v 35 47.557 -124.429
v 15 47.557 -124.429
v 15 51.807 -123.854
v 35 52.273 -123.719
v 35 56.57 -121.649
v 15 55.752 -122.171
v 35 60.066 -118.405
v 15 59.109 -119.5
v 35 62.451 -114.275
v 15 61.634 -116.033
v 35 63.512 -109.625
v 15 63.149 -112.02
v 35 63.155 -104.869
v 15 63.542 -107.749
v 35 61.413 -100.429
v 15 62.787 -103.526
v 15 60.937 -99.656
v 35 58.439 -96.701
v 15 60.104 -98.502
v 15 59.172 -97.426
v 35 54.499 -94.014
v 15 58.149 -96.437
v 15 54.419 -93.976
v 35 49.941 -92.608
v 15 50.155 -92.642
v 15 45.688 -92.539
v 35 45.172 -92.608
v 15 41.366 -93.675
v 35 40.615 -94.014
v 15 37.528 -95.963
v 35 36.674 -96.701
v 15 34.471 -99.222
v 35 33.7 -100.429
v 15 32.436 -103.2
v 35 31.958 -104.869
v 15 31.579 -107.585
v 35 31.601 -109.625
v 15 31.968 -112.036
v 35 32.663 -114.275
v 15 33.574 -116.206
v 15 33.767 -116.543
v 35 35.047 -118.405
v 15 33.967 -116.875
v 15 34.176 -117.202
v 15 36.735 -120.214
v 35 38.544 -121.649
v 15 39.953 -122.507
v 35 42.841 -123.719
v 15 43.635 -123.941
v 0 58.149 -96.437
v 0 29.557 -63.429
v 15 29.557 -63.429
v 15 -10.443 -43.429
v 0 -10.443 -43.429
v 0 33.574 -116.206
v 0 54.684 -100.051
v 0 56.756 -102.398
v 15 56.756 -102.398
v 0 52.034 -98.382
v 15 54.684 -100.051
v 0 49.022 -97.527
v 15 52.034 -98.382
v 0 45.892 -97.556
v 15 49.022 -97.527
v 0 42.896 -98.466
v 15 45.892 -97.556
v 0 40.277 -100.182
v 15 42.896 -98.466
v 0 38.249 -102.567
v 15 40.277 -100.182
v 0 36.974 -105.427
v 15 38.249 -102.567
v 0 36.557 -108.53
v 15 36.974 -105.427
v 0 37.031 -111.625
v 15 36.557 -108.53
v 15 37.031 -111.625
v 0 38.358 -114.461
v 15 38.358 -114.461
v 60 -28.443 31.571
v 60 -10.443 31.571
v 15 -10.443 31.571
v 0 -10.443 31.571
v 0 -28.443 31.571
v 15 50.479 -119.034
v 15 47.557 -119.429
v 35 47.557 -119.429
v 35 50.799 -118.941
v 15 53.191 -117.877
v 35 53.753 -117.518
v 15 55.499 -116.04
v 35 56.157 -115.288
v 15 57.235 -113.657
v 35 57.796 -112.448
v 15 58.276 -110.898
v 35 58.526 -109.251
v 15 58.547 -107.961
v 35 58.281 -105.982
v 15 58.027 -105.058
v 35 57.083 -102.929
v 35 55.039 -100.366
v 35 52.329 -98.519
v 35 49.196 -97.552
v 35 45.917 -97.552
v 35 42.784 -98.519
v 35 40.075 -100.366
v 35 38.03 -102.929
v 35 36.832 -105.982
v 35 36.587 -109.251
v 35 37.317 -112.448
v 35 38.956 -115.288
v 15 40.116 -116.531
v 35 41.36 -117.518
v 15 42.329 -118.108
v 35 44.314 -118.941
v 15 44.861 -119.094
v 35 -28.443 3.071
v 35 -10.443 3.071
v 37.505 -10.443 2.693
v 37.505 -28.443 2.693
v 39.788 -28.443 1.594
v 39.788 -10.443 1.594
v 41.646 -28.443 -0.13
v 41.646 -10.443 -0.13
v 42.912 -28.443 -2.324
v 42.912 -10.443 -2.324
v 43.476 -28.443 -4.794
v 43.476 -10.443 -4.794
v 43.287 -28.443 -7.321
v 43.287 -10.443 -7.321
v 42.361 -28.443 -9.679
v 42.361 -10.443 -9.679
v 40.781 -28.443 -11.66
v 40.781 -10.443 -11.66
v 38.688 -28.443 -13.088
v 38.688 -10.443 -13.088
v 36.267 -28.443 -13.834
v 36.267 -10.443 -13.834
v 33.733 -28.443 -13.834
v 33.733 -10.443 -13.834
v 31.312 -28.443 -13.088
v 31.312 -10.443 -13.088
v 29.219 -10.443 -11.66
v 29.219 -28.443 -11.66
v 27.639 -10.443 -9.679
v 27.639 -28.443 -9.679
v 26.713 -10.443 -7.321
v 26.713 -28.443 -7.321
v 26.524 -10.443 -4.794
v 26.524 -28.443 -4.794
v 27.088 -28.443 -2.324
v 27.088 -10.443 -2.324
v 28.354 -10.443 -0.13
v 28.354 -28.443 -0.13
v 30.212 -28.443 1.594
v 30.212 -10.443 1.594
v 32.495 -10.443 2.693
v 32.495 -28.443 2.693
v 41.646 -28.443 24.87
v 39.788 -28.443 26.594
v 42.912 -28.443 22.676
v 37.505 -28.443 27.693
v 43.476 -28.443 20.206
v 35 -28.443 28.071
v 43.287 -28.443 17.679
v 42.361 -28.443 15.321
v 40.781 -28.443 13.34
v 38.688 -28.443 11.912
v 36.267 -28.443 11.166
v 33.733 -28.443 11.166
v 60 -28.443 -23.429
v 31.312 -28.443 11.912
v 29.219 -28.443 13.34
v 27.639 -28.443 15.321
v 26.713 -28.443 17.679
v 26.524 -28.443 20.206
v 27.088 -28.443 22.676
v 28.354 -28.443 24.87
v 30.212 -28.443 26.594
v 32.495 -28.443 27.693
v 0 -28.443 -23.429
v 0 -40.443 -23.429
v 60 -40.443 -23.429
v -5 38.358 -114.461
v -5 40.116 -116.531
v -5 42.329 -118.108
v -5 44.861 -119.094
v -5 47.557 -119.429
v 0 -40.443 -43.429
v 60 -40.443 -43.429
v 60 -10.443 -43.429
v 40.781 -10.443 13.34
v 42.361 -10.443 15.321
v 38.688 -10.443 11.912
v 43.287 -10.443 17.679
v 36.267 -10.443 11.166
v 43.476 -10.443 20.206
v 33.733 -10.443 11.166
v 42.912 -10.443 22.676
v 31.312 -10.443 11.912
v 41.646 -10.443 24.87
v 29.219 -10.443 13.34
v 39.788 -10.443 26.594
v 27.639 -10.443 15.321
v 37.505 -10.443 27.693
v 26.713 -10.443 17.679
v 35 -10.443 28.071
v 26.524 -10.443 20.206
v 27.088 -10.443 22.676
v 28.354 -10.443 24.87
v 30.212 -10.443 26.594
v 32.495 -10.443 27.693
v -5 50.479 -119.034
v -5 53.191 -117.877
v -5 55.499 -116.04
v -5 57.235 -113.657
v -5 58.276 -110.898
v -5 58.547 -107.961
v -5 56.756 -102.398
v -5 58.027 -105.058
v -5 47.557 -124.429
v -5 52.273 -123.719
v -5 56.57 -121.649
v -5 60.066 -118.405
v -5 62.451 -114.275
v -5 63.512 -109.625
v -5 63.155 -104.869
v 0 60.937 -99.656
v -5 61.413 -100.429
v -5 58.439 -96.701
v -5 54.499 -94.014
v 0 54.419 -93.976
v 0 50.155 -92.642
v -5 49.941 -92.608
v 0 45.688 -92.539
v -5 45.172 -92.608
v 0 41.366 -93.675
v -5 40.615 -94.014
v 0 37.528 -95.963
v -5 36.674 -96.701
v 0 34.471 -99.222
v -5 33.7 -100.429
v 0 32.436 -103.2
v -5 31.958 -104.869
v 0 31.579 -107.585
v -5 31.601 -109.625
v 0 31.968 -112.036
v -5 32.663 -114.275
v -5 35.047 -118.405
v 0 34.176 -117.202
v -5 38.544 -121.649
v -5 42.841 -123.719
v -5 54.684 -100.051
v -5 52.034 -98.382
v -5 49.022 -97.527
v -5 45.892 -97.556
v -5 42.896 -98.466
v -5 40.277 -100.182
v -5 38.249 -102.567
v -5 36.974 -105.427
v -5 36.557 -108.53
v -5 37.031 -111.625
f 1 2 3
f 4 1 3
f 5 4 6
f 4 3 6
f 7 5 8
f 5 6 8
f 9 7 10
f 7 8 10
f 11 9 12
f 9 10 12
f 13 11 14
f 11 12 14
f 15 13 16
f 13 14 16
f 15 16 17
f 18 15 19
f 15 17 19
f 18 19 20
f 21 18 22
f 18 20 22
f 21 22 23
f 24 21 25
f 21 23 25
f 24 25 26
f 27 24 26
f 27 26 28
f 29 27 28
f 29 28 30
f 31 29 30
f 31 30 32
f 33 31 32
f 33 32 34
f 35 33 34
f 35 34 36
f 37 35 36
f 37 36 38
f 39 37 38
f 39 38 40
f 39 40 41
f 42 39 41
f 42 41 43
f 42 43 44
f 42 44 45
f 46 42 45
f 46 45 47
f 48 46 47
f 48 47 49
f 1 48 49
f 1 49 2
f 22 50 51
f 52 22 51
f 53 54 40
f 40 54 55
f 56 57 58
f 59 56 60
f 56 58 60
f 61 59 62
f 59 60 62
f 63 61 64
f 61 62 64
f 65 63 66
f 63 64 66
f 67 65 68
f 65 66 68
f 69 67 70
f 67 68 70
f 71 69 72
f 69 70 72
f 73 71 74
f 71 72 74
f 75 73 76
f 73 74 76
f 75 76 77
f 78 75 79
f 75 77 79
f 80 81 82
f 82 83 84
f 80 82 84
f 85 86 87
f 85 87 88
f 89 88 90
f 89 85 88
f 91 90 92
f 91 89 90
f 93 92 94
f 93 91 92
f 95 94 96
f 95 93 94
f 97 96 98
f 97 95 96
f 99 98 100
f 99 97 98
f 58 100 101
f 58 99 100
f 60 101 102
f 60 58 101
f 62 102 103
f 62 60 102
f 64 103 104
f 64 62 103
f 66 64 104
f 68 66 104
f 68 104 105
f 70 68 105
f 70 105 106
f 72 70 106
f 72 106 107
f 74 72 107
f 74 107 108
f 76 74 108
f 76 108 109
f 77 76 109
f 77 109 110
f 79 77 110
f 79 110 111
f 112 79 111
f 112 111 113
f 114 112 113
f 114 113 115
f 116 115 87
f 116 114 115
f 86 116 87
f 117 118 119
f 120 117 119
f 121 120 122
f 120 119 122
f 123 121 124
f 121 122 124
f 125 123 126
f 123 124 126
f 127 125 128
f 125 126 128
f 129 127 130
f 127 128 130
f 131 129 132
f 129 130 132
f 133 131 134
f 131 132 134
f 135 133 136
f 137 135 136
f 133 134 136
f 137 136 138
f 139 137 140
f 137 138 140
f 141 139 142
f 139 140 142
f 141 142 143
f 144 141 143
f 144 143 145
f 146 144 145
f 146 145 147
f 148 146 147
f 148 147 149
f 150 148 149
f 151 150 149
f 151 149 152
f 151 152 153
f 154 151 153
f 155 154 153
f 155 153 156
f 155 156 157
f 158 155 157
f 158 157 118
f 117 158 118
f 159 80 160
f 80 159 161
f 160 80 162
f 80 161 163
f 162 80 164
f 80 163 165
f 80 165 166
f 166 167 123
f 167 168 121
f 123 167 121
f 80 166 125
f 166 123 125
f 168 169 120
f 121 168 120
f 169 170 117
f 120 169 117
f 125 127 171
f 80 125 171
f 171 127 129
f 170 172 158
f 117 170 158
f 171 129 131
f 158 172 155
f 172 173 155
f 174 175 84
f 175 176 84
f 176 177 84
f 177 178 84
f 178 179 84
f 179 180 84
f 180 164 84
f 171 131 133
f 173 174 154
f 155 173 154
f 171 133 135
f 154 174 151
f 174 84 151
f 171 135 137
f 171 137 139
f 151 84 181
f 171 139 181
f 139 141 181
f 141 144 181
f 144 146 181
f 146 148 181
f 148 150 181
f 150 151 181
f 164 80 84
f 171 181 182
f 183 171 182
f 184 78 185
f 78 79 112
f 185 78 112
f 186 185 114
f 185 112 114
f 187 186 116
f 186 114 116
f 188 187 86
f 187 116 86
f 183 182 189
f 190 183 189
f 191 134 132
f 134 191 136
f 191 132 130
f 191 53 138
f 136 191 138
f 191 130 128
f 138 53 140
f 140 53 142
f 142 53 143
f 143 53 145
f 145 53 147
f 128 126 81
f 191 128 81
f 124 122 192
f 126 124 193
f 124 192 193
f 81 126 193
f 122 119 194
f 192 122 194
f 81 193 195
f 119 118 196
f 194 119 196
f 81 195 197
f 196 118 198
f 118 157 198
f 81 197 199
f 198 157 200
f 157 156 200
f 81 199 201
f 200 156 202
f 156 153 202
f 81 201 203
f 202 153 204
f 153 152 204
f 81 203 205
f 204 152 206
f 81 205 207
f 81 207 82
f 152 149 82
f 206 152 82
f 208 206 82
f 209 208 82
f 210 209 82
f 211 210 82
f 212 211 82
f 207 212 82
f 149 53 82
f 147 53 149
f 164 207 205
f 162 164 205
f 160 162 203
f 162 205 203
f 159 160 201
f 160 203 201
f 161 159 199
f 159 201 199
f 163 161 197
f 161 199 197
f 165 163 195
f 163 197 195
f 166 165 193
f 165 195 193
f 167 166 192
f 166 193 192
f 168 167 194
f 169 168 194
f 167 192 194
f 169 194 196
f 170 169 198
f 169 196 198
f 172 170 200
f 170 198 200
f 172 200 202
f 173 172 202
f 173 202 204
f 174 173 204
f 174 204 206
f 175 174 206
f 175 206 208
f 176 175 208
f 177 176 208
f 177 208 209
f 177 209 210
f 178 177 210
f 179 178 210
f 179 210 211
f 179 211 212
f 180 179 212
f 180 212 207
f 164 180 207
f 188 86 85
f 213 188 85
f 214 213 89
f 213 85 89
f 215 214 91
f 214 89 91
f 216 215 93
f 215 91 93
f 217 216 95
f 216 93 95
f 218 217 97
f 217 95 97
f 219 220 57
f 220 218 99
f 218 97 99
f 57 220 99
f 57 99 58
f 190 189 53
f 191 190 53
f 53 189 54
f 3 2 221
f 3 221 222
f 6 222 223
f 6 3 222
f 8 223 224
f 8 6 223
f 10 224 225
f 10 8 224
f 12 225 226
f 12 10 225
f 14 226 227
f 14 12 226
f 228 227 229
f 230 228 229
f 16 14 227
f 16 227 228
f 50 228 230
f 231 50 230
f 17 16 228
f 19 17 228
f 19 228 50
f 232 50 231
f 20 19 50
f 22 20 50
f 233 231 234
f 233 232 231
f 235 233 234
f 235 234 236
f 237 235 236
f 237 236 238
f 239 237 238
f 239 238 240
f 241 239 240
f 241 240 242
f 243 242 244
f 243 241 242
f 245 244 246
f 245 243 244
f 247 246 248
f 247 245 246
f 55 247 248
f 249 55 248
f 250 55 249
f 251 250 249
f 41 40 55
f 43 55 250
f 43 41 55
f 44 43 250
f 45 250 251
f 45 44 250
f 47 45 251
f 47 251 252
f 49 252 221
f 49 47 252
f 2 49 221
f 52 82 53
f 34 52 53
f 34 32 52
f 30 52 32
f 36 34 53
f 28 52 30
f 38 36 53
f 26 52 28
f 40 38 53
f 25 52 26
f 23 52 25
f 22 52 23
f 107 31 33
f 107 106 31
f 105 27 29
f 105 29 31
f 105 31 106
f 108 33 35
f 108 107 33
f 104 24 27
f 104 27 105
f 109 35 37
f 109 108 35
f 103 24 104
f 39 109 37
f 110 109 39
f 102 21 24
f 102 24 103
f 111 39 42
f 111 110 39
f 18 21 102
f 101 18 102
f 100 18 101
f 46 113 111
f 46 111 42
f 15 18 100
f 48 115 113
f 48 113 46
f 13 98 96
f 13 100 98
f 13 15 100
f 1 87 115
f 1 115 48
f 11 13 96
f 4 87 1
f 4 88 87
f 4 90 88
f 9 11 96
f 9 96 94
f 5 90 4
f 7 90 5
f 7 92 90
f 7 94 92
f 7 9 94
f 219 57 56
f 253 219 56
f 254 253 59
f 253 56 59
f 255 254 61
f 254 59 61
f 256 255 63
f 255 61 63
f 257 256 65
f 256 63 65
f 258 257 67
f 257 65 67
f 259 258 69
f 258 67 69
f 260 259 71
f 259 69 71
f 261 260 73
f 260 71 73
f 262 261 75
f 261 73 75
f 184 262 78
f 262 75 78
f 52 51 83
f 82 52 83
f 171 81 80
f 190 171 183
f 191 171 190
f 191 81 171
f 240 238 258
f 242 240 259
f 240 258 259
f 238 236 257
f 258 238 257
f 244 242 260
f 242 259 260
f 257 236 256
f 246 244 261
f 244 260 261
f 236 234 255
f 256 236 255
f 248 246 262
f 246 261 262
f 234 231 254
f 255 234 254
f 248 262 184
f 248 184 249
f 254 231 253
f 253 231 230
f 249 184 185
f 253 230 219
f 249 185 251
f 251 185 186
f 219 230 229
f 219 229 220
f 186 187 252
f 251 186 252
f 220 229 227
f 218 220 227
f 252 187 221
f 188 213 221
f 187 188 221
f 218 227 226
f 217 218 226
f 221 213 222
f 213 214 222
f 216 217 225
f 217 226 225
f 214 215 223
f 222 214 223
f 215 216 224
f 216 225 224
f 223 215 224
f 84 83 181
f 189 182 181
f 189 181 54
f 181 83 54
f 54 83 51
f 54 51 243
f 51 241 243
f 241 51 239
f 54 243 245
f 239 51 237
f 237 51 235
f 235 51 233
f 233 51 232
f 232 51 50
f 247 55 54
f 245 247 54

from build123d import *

# Parameters (mm, degrees)
BOSS_EXTRUDE1_DEPTH      = 60
SKETCH2_R                = 8.5
CUT_EXTRUDE1_DEPTH       = 60
BOSS_EXTRUDE2_DEPTH      = 15
SKETCH3_R                = 16
SKETCH3_R_2              = 11
BOSS_EXTRUDE3_DEPTH      = 20
BOSS_EXTRUDE3_DEPTH_BACK = 20
CUT_EXTRUDE2_DEPTH       = 57


with BuildPart() as part:
    # Sketch1 → Boss-Extrude1 (new body)
    with BuildSketch(Plane(origin=(0, 0, 0), x_dir=(0, 0, -1), z_dir=(1, 0, 0))):
        Polygon((-31.570634591, -10.443354749), (-31.570634591, -28.443354749), (23.429365409, -28.443354749), (23.429365409, -40.443354749), (43.429365409, -40.443354749), (43.429365409, -10.443354749), align=None)
    extrude(amount=BOSS_EXTRUDE1_DEPTH)

    # Sketch2 → Cut-Extrude1 (cut)
    with BuildSketch(Plane(origin=(0, -10.443354749, 0), x_dir=(1, 0, 0), z_dir=(0, 1, 0))):
        with Locations(Location((35, -19.570634591, 0), (0, 0, 270))):
            Circle(SKETCH2_R)
        with Locations(Location((35, 5.429365409, 0), (0, 0, 270))):
            Circle(SKETCH2_R)
    extrude(amount=-CUT_EXTRUDE1_DEPTH, mode=Mode.SUBTRACT)

    # 3DSketch1 → Boss-Extrude2 (add)
    with BuildSketch(Plane(origin=(0, -10.443354749, 31.570634591), x_dir=(0, 0.28727544621498696, -0.9578480140408394), z_dir=(1, 0, 0))):
        Polygon((0, 0), (71.838601053, -21.545658466), (155.320085422, 0), (146.20131027, 30.673244689), (102.486579182, 11.022753171), align=None)
    extrude(amount=BOSS_EXTRUDE2_DEPTH)

    # Sketch3 → Boss-Extrude3 (add, two sides)
    with BuildSketch(Plane(origin=(15, 0, 0), x_dir=(0, 0, -1), z_dir=(1, 0, 0))) as boss_extrude3_sk:
        with Locations((108.429365409, 47.556645251)):
            Circle(SKETCH3_R)
        with Locations((108.429365409, 47.556645251)):
            Circle(SKETCH3_R_2, mode=Mode.SUBTRACT)
    extrude(amount=BOSS_EXTRUDE3_DEPTH)
    extrude(boss_extrude3_sk.sketch, amount=-BOSS_EXTRUDE3_DEPTH_BACK)

    # Sketch4 → Cut-Extrude2 (cut)
    with BuildSketch(Plane(origin=(15, 0, 0), x_dir=(0, 0, -1), z_dir=(1, 0, 0))):
        with BuildLine():
            Line((114.460827221, 38.357652457), (102.397903597, 56.755638044))
            ThreePointArc((102.397903597, 56.755638044), (99.230372615, 41.525183439), (114.460827221, 38.357652457))
        make_face()
    extrude(amount=-CUT_EXTRUDE2_DEPTH, mode=Mode.SUBTRACT)


solid = part.part
